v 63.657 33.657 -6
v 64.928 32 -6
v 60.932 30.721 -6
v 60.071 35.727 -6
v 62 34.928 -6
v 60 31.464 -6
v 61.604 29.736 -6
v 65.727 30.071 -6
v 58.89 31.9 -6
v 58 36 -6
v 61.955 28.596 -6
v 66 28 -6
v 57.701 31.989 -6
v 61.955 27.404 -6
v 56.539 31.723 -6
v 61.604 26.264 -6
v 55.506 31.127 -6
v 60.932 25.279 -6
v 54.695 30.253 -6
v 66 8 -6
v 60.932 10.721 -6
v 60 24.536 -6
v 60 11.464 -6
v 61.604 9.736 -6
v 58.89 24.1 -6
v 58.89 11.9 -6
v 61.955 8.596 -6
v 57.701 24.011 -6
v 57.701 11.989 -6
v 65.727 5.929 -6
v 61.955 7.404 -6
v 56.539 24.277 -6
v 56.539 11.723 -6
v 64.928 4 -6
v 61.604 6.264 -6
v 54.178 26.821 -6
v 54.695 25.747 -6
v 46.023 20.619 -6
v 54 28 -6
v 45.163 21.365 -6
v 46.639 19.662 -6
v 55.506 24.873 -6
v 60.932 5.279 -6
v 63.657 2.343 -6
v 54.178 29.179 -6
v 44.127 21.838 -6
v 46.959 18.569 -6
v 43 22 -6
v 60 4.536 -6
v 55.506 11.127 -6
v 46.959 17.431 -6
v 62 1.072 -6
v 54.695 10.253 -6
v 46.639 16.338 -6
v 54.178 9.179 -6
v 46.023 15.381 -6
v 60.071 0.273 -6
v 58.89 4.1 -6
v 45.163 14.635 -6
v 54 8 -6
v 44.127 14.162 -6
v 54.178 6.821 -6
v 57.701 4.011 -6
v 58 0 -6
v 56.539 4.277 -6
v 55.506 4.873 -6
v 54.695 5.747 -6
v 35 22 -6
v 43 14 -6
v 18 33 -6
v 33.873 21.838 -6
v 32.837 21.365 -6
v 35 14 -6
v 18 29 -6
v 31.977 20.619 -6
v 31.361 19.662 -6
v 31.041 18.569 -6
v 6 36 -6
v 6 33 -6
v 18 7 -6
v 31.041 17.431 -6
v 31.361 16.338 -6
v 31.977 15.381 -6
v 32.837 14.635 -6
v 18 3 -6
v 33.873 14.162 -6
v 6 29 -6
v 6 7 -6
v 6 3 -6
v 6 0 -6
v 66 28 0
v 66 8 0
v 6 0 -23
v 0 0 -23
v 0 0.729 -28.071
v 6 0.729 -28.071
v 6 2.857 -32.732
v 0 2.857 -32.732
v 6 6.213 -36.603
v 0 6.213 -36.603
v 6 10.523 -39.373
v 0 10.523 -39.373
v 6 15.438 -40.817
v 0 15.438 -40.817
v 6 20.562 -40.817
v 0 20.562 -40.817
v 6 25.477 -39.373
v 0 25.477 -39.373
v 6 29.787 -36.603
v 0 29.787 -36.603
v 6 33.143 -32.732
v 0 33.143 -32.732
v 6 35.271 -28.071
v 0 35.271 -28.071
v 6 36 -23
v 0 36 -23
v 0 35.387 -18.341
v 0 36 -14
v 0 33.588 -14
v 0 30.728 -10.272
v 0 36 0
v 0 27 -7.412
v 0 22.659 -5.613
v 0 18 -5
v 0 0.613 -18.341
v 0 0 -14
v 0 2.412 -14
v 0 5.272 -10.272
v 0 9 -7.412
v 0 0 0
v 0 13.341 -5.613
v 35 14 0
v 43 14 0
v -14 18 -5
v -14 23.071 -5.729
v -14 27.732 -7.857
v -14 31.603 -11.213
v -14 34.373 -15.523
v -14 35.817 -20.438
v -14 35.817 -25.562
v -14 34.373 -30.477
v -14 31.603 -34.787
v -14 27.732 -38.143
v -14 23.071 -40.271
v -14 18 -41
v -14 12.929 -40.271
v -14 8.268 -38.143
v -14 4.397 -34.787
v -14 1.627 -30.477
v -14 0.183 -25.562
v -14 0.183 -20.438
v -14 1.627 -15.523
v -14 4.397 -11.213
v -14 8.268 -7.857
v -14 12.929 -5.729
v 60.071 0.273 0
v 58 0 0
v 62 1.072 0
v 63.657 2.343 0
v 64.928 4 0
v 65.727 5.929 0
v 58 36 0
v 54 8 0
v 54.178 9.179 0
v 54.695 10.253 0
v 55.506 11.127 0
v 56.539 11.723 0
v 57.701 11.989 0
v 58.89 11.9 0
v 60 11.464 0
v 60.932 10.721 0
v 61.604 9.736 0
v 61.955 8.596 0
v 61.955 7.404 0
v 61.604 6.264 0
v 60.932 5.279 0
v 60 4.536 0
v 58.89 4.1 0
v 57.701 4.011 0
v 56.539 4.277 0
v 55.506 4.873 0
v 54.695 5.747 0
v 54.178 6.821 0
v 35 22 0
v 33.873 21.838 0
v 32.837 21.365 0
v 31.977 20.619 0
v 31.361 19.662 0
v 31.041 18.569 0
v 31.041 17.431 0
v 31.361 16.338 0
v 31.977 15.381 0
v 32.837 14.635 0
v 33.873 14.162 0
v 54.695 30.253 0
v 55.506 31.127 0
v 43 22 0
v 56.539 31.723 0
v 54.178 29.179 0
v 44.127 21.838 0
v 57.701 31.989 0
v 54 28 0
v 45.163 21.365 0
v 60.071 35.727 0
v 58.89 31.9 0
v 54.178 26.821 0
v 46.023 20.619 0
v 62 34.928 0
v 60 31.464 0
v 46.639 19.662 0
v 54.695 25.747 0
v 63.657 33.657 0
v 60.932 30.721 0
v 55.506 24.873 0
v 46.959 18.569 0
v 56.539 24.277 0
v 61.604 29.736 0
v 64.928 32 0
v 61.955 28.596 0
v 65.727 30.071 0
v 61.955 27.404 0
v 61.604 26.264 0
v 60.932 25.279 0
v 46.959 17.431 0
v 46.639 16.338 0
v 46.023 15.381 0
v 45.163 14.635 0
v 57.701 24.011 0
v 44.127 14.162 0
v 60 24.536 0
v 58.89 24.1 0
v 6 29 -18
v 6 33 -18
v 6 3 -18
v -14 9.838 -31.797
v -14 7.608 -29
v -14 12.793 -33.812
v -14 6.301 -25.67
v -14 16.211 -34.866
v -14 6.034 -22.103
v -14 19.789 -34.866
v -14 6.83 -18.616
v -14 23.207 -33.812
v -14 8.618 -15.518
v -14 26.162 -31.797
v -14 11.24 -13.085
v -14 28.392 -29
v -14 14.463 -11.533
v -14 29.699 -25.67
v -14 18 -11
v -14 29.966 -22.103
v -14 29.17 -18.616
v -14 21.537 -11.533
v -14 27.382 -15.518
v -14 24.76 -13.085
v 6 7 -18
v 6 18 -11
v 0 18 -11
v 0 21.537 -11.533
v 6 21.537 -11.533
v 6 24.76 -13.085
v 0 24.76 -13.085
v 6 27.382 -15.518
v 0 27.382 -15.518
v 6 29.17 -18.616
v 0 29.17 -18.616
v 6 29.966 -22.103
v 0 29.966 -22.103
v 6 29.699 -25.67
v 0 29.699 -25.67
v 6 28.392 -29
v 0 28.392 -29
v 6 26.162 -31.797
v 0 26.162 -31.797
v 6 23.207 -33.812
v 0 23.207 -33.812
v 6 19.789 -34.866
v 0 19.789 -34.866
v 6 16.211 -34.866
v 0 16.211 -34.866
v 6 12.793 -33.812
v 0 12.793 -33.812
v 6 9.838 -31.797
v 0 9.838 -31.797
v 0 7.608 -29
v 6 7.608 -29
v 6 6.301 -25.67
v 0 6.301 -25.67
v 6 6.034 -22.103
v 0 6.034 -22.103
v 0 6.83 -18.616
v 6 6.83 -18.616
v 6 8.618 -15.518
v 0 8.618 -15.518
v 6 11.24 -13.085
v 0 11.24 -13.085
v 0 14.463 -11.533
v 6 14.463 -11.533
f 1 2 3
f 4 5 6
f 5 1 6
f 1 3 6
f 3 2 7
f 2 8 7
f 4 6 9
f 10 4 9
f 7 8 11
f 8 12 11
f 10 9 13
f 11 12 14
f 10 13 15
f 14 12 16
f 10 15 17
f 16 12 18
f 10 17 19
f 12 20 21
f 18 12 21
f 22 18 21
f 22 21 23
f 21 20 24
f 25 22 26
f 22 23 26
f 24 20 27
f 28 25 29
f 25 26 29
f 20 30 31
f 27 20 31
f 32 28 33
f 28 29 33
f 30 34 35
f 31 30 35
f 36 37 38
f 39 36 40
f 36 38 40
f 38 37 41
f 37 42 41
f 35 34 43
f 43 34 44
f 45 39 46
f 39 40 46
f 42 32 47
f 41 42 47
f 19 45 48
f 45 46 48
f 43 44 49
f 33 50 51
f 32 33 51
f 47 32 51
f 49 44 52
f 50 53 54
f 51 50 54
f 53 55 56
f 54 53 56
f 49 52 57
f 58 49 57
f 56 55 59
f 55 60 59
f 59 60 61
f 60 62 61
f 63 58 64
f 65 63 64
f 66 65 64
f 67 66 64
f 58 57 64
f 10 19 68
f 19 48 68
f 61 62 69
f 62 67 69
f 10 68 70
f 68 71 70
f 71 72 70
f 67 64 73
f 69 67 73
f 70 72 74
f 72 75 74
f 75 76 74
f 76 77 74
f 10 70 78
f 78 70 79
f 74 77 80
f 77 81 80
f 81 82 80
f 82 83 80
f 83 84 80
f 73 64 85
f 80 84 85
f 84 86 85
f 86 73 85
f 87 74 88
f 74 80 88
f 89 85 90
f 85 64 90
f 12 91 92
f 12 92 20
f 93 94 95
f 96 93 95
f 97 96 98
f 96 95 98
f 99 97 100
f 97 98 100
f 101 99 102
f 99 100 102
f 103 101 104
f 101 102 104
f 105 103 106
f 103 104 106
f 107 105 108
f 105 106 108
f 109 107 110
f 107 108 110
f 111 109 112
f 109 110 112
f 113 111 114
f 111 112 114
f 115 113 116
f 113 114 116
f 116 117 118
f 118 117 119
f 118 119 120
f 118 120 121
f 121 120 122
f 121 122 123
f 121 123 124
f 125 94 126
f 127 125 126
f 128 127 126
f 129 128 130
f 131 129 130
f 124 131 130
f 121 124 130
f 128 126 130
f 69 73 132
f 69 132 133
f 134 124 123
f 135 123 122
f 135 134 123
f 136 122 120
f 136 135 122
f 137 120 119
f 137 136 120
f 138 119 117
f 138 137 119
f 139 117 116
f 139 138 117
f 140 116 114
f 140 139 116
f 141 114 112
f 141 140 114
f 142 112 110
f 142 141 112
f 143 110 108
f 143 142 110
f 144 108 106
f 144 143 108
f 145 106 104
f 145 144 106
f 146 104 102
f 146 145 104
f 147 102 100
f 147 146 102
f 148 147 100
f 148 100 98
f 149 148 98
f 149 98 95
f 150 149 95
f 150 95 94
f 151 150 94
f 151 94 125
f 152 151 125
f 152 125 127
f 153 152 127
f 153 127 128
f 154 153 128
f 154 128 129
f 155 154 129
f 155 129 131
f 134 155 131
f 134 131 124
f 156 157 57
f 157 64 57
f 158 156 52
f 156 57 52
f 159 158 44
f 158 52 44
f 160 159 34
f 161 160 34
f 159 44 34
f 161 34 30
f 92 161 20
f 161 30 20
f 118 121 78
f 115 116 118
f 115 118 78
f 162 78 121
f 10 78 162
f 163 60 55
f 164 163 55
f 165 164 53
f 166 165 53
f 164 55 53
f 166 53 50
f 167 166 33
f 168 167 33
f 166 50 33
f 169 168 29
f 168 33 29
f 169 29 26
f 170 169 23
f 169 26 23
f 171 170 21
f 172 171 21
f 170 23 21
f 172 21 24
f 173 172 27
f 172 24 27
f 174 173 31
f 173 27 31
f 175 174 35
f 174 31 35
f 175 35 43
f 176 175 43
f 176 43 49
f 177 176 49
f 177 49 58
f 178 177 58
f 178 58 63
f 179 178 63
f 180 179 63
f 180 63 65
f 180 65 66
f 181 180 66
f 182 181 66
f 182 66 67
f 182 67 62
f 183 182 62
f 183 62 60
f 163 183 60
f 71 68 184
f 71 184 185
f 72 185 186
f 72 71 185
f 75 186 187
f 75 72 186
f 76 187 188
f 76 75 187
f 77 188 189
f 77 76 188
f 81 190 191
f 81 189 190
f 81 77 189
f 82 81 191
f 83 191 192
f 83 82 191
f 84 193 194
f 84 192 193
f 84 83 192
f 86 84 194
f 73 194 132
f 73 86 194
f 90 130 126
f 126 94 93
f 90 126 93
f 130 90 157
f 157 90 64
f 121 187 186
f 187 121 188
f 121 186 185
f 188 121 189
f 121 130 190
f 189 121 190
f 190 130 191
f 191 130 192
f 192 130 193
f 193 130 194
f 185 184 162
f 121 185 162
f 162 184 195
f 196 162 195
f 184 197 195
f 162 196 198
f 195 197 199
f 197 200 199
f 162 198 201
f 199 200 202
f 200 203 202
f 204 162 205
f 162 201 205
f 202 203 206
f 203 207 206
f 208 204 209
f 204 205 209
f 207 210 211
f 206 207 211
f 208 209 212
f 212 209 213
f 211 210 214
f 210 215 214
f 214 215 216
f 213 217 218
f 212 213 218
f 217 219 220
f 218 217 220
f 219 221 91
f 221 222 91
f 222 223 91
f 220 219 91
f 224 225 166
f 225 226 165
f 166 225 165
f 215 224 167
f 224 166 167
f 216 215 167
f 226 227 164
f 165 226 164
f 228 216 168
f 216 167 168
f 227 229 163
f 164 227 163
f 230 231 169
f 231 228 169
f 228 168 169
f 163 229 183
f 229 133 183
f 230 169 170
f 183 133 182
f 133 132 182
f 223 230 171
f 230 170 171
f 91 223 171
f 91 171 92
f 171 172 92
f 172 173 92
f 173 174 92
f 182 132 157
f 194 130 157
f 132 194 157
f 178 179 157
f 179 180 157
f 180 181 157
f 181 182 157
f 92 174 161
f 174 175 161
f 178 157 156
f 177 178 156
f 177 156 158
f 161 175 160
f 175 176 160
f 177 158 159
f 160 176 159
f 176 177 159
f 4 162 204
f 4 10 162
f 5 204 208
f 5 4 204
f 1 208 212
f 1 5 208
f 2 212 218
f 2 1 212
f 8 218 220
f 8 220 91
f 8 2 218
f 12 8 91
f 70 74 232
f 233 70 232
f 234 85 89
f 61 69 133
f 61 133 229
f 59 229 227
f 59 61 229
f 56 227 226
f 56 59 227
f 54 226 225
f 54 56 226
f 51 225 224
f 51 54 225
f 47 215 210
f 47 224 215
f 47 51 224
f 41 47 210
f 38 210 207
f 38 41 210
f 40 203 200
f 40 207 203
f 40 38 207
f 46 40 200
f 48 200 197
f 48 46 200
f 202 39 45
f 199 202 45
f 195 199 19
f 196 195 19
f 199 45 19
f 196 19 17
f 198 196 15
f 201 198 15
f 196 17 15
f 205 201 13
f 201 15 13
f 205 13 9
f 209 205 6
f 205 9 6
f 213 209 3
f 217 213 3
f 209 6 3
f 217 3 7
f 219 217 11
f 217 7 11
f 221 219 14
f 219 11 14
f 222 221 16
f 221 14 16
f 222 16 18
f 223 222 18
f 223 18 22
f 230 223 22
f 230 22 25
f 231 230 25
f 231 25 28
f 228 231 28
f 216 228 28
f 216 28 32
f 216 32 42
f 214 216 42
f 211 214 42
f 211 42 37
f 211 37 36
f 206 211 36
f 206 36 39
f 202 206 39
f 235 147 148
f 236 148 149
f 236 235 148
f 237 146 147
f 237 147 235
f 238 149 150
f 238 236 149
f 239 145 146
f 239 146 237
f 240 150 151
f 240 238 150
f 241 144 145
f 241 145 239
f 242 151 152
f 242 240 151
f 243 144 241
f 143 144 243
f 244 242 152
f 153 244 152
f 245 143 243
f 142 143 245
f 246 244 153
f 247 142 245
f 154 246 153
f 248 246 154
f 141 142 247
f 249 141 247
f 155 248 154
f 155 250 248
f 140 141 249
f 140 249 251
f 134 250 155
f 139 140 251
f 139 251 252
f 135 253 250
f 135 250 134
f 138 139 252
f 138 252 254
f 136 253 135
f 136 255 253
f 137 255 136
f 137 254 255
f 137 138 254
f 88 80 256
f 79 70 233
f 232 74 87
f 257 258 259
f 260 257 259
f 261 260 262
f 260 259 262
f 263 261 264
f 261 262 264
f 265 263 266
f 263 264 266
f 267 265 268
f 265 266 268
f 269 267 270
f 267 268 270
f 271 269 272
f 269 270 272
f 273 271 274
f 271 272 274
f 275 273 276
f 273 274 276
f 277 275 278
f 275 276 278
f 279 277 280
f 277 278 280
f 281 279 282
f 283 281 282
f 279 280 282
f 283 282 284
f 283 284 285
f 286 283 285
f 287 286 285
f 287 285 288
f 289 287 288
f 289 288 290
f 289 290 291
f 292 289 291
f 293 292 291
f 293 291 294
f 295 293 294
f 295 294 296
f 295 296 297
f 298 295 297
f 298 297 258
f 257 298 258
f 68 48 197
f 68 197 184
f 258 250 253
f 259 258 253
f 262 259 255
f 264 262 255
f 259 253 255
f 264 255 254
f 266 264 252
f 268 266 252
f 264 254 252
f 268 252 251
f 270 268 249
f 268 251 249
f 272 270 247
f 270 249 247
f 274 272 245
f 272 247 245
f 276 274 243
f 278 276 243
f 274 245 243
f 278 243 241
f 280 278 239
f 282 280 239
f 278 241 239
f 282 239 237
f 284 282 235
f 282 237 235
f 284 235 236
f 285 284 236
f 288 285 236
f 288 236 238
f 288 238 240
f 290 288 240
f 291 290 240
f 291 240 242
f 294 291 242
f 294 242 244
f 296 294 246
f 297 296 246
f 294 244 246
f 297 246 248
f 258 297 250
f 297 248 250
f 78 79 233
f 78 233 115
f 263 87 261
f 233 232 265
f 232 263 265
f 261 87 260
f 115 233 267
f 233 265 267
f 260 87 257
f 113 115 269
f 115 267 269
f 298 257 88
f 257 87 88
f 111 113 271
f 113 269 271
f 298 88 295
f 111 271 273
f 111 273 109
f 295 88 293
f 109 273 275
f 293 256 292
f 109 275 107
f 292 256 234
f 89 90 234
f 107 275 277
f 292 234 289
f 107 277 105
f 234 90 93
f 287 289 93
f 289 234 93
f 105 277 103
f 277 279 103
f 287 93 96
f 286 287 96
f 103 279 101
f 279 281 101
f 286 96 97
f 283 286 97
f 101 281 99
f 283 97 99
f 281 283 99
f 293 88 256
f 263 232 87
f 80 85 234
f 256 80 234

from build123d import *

# Parameters (mm, degrees)
BOSS_EXTRUDE1_DEPTH = 36
SKETCH2_W           = 16.184746641
SKETCH2_H           = 32
CUT_EXTRUDE1_DEPTH  = 36
CUT_EXTRUDE2_DEPTH  = 36
SKETCH4_3_R         = 12
CUT_EXTRUDE3_DEPTH  = 36
BOSS_EXTRUDE2_START = 14
SKETCH4_4_R         = 12
BOSS_EXTRUDE2_DEPTH = 14
SKETCH5_R           = 4
CUT_EXTRUDE4_DEPTH  = 14
FILLET2_R           = 8
SKETCH9_W           = 12
SKETCH9_H           = 4
BOSS_EXTRUDE3_DEPTH = 12
CUT_EXTRUDE5_DEPTH  = 53


with BuildPart() as part:
    # Sketch1 → Boss-Extrude1 (new body)
    with BuildSketch(Plane(origin=(0, 0, 0), x_dir=(1, 0, 0), z_dir=(0, 1, 0))):
        Polygon((0, 0), (66, 0), (66, 6), (6, 6), (6, 46), (-14, 46), (-14, 14), (0, 14), align=None)
    extrude(amount=BOSS_EXTRUDE1_DEPTH)

    # Sketch2 → Cut-Extrude1 (cut)
    with BuildSketch(Plane(origin=(0, 36, 0), x_dir=(1, 0, 0), z_dir=(0, 1, 0))):
        with Locations((-8.092373321, 30)):
            Rectangle(SKETCH2_W, SKETCH2_H)
    extrude(amount=-CUT_EXTRUDE1_DEPTH, mode=Mode.SUBTRACT)

    # Sketch4 → Cut-Extrude2 (cut)
    with BuildSketch(Plane.ZY):
        with BuildLine():
            ThreePointArc((-23, 0), (-41, 18), (-23, 36))
            Line((-23, 36), (-46, 36))
            Line((-46, 36), (-46, 0))
            Line((-46, 0), (-23, 0))
        make_face()
    extrude(amount=-CUT_EXTRUDE2_DEPTH, mode=Mode.SUBTRACT)

    # Sketch4<3> → Cut-Extrude3 (cut)
    with BuildSketch(Plane.ZY):
        with Locations((-23, 18)):
            Circle(SKETCH4_3_R)
    extrude(amount=-CUT_EXTRUDE3_DEPTH, mode=Mode.SUBTRACT)

    # Sketch4<4> → Boss-Extrude2 (add)
    with BuildSketch(Plane.ZY.offset(BOSS_EXTRUDE2_START)):
        with BuildLine():
            ThreePointArc((-5, 18), (-10.272077939, 30.727922061), (-23, 36))
            ThreePointArc((-23, 36), (-41, 18), (-23, 0))
            ThreePointArc((-23, 0), (-10.272077939, 5.272077939), (-5, 18))
        make_face()
        with Locations((-23, 18)):
            Circle(SKETCH4_4_R, mode=Mode.SUBTRACT)
    extrude(amount=-BOSS_EXTRUDE2_DEPTH)

    # Sketch5 → Cut-Extrude4 (cut)
    with BuildSketch(Plane(origin=(0, 0, -6), x_dir=(-1, 0, 0), z_dir=(0, 0, -1))):
        with Locations((-58, 28)):
            Circle(SKETCH5_R)
        with Locations((-58, 8)):
            Circle(SKETCH5_R)
        with BuildLine():
            Line((-43, 22), (-35, 22))
            ThreePointArc((-35, 22), (-31, 18), (-35, 14))
            Line((-35, 14), (-43, 14))
            ThreePointArc((-43, 14), (-47, 18), (-43, 22))
        make_face()
    extrude(amount=-CUT_EXTRUDE4_DEPTH, mode=Mode.SUBTRACT)

    # Fillet2
    fillet2_edges = [part.edges().sort_by_distance(p)[0] for p in [
        (66, 36, -3),
        (66, 0, -3),
    ]]
    fillet(fillet2_edges, radius=FILLET2_R)

    # Sketch9 → Boss-Extrude3 (add)
    with BuildSketch(Plane(origin=(0, 0, -6), x_dir=(-1, 0, 0), z_dir=(0, 0, -1))):
        with Locations((-12, 31)):
            Rectangle(SKETCH9_W, SKETCH9_H)
        with Locations((-12, 5)):
            Rectangle(SKETCH9_W, SKETCH9_H)
    extrude(amount=BOSS_EXTRUDE3_DEPTH)

    # Sketch10 → Cut-Extrude5 (cut)
    with BuildSketch(Plane.XZ.offset(-3)):
        Polygon((18, -6), (6, -18), (14.583968048, -28.688637826), (24.603794653, -16.204919433), align=None)
    extrude(amount=-CUT_EXTRUDE5_DEPTH, mode=Mode.SUBTRACT)


solid = part.part
